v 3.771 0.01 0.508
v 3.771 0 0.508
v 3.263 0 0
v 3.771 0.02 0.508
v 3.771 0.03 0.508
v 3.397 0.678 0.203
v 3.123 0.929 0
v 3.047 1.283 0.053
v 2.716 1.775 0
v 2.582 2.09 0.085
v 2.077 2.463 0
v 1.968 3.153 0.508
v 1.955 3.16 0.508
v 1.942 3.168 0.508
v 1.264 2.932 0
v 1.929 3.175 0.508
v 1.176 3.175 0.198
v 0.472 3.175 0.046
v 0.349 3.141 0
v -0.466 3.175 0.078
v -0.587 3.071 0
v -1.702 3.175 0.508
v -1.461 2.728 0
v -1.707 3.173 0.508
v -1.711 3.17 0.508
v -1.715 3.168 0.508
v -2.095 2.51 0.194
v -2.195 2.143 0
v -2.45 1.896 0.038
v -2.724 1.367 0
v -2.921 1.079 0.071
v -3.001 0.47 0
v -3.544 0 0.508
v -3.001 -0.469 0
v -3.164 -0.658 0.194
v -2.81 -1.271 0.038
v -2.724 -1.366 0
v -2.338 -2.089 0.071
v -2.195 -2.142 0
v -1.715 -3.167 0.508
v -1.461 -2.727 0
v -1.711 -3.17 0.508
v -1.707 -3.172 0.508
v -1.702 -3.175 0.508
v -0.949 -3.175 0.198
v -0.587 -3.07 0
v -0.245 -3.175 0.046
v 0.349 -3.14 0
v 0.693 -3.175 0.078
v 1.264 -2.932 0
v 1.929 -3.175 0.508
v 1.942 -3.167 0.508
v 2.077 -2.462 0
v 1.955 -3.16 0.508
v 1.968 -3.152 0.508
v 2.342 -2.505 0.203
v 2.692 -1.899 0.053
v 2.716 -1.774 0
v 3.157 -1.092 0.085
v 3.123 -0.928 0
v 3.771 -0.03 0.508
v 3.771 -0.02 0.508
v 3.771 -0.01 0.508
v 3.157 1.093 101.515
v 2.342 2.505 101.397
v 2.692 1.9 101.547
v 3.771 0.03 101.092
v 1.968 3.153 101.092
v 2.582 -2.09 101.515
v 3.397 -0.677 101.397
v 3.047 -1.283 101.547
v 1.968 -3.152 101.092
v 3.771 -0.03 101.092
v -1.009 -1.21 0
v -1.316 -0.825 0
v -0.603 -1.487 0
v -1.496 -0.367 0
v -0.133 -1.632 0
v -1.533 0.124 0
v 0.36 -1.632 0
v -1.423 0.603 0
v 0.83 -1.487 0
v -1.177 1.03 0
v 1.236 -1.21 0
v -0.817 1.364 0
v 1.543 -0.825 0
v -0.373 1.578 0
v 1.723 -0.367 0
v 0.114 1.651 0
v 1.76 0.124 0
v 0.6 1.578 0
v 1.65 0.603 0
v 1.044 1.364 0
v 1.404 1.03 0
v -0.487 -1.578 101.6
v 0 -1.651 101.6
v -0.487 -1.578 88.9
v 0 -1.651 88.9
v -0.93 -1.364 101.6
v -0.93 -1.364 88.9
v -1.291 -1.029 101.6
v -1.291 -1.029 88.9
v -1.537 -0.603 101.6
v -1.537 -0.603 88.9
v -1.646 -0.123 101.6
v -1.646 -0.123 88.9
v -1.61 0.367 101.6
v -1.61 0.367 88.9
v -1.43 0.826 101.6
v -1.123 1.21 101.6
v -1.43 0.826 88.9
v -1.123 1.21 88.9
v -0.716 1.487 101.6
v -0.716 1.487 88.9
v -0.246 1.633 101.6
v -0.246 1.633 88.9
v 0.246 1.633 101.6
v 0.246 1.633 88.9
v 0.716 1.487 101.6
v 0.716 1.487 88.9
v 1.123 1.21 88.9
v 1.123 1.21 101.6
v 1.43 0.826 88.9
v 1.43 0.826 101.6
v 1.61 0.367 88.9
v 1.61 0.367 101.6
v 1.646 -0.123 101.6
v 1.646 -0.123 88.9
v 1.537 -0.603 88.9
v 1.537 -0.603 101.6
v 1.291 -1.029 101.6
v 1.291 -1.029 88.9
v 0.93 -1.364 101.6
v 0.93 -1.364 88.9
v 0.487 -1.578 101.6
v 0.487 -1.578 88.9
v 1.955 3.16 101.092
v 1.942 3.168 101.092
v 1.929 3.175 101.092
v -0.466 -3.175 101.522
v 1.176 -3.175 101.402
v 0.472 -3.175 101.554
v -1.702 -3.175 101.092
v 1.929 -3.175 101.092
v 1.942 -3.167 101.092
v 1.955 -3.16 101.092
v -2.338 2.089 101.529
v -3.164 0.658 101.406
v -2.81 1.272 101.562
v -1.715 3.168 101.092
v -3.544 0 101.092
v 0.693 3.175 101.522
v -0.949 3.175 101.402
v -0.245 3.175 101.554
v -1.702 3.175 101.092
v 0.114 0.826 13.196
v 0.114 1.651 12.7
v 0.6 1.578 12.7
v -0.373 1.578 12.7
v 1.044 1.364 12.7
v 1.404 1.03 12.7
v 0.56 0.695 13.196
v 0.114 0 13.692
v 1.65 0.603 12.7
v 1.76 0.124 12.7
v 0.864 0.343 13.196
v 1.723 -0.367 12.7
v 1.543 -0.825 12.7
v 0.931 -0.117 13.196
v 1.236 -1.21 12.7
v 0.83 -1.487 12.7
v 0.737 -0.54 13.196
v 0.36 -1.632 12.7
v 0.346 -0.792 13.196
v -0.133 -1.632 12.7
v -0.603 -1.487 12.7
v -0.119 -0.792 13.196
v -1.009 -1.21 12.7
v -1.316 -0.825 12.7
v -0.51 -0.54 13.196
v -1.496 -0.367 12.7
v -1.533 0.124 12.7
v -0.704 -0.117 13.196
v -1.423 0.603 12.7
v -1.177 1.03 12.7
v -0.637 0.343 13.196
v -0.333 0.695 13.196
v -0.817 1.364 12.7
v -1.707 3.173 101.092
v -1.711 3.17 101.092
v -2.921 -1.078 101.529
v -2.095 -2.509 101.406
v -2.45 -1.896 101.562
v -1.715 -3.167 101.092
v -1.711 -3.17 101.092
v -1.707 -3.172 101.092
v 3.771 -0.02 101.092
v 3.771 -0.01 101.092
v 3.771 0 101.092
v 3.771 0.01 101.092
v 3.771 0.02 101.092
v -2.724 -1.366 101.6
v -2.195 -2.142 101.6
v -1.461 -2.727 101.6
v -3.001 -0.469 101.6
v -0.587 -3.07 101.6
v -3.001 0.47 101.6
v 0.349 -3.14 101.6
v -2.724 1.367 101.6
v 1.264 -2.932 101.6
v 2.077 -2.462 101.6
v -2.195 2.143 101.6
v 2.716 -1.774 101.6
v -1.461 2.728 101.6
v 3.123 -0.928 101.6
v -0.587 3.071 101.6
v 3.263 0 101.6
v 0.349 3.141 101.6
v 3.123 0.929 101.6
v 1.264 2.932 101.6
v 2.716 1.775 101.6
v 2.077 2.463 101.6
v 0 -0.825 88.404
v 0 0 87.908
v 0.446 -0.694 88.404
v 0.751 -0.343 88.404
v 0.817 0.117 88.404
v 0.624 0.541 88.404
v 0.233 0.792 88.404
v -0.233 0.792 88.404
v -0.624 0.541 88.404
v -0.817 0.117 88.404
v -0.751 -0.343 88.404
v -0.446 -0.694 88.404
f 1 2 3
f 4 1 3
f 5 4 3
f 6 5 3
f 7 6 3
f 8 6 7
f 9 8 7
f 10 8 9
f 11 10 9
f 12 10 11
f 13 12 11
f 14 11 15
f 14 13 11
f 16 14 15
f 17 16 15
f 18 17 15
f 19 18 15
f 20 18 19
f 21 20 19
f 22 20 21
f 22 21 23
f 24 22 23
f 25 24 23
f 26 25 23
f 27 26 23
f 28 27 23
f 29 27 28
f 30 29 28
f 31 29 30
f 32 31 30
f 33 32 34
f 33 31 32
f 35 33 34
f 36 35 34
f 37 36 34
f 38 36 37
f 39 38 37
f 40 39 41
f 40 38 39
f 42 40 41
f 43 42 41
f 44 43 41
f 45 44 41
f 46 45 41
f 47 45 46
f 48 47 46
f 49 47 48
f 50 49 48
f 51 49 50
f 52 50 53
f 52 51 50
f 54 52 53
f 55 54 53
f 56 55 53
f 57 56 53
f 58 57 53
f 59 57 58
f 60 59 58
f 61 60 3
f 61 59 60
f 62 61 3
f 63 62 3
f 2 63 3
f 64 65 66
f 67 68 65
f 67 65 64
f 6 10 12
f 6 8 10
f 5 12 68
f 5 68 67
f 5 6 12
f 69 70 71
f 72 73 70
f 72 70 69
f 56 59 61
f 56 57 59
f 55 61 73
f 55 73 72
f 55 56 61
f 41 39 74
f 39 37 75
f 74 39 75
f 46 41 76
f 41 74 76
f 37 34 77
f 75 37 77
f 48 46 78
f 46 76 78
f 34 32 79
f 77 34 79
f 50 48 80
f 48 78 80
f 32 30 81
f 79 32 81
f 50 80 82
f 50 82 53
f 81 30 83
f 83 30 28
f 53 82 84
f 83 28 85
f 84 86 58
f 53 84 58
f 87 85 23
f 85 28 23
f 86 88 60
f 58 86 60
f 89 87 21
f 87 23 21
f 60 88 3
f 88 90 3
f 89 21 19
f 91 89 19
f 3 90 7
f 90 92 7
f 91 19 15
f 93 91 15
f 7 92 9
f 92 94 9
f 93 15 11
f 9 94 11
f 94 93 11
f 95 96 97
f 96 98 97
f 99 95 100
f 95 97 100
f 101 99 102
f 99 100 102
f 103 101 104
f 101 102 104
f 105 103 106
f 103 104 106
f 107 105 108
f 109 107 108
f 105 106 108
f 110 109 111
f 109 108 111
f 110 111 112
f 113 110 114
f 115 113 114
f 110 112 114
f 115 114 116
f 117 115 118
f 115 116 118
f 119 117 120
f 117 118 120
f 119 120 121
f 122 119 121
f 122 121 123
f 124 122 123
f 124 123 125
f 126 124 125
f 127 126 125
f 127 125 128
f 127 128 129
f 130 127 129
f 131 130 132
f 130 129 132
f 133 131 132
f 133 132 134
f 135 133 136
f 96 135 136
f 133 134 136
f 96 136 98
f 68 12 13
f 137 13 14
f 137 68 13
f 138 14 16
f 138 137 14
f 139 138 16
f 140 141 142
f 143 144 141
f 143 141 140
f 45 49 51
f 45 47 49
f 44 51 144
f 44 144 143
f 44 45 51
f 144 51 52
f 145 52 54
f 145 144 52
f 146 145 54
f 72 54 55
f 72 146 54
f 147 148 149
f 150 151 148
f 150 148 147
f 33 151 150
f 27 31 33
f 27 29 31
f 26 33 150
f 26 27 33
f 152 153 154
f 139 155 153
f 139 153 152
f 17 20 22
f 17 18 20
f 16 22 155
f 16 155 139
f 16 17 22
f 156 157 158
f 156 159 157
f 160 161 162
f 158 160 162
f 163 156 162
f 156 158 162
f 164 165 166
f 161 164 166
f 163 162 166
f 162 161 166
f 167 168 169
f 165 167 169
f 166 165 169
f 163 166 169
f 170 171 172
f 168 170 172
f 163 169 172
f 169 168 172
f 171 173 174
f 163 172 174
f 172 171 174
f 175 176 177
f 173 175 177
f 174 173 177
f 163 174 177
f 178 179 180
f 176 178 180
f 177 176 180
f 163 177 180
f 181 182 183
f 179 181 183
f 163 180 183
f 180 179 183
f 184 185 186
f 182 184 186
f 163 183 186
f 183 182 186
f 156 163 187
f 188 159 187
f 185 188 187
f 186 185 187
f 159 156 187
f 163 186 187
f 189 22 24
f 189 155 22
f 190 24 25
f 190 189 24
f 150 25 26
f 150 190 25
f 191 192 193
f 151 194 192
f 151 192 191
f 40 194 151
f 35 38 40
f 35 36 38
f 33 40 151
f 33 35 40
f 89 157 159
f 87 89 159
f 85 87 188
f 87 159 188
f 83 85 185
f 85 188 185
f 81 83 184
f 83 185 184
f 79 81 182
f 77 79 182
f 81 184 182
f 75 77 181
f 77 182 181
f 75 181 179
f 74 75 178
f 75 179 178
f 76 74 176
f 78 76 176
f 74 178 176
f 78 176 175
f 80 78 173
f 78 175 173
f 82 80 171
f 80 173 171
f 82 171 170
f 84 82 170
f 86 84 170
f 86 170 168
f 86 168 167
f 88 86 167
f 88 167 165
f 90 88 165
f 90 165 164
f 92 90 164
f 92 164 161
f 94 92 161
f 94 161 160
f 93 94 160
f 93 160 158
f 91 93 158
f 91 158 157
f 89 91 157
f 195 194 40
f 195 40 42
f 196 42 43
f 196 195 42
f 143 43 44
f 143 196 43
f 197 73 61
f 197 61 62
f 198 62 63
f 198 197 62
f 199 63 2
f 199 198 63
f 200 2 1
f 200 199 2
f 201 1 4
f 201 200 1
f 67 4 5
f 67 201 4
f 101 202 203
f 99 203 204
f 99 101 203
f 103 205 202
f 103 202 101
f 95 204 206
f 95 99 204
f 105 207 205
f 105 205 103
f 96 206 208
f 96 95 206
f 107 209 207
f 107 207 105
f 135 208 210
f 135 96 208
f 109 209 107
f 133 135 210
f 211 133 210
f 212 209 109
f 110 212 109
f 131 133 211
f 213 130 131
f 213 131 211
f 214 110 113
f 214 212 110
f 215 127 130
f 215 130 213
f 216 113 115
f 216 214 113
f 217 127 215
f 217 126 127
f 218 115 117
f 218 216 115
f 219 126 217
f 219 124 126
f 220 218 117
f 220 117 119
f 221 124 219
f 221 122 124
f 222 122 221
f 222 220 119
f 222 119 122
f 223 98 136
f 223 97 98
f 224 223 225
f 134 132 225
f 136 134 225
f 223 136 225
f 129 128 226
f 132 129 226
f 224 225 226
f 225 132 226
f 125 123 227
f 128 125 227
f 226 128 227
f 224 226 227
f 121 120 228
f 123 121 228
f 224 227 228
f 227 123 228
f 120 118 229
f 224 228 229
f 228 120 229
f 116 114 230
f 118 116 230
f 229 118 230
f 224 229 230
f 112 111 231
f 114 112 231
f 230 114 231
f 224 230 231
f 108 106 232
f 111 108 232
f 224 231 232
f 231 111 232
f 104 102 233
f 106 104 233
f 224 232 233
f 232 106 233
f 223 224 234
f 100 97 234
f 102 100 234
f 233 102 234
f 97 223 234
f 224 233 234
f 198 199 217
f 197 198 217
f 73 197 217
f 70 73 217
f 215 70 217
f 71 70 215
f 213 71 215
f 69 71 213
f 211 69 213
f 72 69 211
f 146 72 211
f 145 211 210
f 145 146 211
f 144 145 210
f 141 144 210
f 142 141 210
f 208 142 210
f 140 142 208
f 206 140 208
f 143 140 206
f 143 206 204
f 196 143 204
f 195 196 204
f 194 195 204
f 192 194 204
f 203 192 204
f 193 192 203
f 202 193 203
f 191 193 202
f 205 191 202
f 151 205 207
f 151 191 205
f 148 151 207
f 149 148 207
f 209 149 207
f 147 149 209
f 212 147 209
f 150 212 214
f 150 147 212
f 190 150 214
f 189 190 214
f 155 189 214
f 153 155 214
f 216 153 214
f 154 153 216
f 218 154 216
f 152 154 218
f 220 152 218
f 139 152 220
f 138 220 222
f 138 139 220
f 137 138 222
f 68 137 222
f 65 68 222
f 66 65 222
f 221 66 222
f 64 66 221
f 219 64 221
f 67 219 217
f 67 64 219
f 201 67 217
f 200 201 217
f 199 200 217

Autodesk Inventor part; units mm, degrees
ref_plane "YZ Plane" through (0, 0, 0) normal (1, 0, 0) x (0, 1, 0)
sketch "Sketch1" plane through (0, 0, 0) normal (0, 0, 1) x (1, 0, 0)
  line L0 (1.9552, -3.1747) -> (-1.711, -3.1747)
  line L1 (-1.711, -3.1747) -> (-3.5441, 0.0003)
  line L2 (-3.5441, 0.0003) -> (-1.711, 3.1753)
  line L3 (-1.711, 3.1753) -> (1.9552, 3.1753)
  line L4 (1.9552, 3.1753) -> (3.7883, 0.0003)
  line L5 (3.7883, 0.0003) -> (1.9552, -3.1747)
  point P0 (0.1221, 0.0003)
  dimension "d0" = 6.35
extrude "Extrusion1" add sketch "Sketch1" along normal blind 101.6
ref_plane "Work Plane1" through (-1.711, 0.0003, 0) normal (0, 1, 0) x (1, 0, 0)
sketch "Sketch3" plane through (-1.711, 0.0003, 0) normal (0, 1, 0) x (1, 0, 0)
  line L0 (-1.3251, 0) -> (4.9741, 0)
  line L1 (5.4821, -0.508) -> (5.4821, -101.092)
  line L2 (-1.8331, -101.092) -> (-1.8331, -0.508)
  line L3 (-1.8331, -0.508) -> (-1.3251, 0)
  line L4 (4.9741, 0) -> (5.4821, -0.508)
  line L5 (-1.8331, 0) -> (-1.8331, -101.6) projected
  line L6 (3.6662, 0) -> (5.4993, 0) projected
  line L7 (1.8245, 0) -> (1.8245, -101.6)
  line L8 (0, -101.6) -> (-1.8331, -101.6) projected
  line L9 (5.4993, -101.6) -> (3.6662, -101.6) projected
  line L10 (3.6662, -101.6) -> (0, -101.6) projected
  line L11 (-1.3251, -101.6) -> (-1.8331, -101.092)
  line L12 (4.9741, -101.6) -> (5.4821, -101.092)
  point P0 (-1.8331, 0)
  point P1 (5.4821, 0)
  point P2 (5.4821, -101.6)
  dimension "d5" = 0.508
  dimension "d6" = 0.508
  dimension "d7" = 0.508
  dimension "d8" = 0.508
  dimension "d16" = 0
  dimension "d46" = 0.508
  dimension "d47" = 0.508
  dimension "d48" = 0.508
  dimension "d49" = 0.508
revolve "Revolution1" cut sketch "Sketch3" angle 360 about axis through (0.1135, 0.0003, 0) along (0, 0, 1) keep common part contours L0 L4 L1 L12 L9 L10 L7
sketch "Sketch6" plane through (0.1135, 0.0003, 0) normal (0, 0, -1) x (-1, 0, 0)
  circle A0 centre (0, 0) radius 3.1496 projected
hole "Hole3" at (0.1135, 0.0003, 0) direction (0, 0, 1) diameter 3.302 depth 12.7 tip angle 118 thread size "8-32 UNC" class "2B" standard "ANSI Unified Screw Threads"
sketch "Sketch7" plane through (0, 0, 101.6) normal (0, 0, 1) x (1, 0, 0)
  point P0 (0, 0)
hole "Hole4" at (0, 0, 101.6) direction (0, 0, -1) diameter 3.302 depth 12.7 tip angle 118 thread size "8-32 UNC" class "2B" standard "ANSI Unified Screw Threads"
ref_plane "Work Plane2" through (0.1135, 0.0003, 50.8) normal (0, 0, -1) x (-1, 0, 0)
equation "\"d6\" = d5"
equation "\"d7\" = d5"
equation "\"d8\" = d7"
properties part number "4 inch Standoff" material "Steel"
